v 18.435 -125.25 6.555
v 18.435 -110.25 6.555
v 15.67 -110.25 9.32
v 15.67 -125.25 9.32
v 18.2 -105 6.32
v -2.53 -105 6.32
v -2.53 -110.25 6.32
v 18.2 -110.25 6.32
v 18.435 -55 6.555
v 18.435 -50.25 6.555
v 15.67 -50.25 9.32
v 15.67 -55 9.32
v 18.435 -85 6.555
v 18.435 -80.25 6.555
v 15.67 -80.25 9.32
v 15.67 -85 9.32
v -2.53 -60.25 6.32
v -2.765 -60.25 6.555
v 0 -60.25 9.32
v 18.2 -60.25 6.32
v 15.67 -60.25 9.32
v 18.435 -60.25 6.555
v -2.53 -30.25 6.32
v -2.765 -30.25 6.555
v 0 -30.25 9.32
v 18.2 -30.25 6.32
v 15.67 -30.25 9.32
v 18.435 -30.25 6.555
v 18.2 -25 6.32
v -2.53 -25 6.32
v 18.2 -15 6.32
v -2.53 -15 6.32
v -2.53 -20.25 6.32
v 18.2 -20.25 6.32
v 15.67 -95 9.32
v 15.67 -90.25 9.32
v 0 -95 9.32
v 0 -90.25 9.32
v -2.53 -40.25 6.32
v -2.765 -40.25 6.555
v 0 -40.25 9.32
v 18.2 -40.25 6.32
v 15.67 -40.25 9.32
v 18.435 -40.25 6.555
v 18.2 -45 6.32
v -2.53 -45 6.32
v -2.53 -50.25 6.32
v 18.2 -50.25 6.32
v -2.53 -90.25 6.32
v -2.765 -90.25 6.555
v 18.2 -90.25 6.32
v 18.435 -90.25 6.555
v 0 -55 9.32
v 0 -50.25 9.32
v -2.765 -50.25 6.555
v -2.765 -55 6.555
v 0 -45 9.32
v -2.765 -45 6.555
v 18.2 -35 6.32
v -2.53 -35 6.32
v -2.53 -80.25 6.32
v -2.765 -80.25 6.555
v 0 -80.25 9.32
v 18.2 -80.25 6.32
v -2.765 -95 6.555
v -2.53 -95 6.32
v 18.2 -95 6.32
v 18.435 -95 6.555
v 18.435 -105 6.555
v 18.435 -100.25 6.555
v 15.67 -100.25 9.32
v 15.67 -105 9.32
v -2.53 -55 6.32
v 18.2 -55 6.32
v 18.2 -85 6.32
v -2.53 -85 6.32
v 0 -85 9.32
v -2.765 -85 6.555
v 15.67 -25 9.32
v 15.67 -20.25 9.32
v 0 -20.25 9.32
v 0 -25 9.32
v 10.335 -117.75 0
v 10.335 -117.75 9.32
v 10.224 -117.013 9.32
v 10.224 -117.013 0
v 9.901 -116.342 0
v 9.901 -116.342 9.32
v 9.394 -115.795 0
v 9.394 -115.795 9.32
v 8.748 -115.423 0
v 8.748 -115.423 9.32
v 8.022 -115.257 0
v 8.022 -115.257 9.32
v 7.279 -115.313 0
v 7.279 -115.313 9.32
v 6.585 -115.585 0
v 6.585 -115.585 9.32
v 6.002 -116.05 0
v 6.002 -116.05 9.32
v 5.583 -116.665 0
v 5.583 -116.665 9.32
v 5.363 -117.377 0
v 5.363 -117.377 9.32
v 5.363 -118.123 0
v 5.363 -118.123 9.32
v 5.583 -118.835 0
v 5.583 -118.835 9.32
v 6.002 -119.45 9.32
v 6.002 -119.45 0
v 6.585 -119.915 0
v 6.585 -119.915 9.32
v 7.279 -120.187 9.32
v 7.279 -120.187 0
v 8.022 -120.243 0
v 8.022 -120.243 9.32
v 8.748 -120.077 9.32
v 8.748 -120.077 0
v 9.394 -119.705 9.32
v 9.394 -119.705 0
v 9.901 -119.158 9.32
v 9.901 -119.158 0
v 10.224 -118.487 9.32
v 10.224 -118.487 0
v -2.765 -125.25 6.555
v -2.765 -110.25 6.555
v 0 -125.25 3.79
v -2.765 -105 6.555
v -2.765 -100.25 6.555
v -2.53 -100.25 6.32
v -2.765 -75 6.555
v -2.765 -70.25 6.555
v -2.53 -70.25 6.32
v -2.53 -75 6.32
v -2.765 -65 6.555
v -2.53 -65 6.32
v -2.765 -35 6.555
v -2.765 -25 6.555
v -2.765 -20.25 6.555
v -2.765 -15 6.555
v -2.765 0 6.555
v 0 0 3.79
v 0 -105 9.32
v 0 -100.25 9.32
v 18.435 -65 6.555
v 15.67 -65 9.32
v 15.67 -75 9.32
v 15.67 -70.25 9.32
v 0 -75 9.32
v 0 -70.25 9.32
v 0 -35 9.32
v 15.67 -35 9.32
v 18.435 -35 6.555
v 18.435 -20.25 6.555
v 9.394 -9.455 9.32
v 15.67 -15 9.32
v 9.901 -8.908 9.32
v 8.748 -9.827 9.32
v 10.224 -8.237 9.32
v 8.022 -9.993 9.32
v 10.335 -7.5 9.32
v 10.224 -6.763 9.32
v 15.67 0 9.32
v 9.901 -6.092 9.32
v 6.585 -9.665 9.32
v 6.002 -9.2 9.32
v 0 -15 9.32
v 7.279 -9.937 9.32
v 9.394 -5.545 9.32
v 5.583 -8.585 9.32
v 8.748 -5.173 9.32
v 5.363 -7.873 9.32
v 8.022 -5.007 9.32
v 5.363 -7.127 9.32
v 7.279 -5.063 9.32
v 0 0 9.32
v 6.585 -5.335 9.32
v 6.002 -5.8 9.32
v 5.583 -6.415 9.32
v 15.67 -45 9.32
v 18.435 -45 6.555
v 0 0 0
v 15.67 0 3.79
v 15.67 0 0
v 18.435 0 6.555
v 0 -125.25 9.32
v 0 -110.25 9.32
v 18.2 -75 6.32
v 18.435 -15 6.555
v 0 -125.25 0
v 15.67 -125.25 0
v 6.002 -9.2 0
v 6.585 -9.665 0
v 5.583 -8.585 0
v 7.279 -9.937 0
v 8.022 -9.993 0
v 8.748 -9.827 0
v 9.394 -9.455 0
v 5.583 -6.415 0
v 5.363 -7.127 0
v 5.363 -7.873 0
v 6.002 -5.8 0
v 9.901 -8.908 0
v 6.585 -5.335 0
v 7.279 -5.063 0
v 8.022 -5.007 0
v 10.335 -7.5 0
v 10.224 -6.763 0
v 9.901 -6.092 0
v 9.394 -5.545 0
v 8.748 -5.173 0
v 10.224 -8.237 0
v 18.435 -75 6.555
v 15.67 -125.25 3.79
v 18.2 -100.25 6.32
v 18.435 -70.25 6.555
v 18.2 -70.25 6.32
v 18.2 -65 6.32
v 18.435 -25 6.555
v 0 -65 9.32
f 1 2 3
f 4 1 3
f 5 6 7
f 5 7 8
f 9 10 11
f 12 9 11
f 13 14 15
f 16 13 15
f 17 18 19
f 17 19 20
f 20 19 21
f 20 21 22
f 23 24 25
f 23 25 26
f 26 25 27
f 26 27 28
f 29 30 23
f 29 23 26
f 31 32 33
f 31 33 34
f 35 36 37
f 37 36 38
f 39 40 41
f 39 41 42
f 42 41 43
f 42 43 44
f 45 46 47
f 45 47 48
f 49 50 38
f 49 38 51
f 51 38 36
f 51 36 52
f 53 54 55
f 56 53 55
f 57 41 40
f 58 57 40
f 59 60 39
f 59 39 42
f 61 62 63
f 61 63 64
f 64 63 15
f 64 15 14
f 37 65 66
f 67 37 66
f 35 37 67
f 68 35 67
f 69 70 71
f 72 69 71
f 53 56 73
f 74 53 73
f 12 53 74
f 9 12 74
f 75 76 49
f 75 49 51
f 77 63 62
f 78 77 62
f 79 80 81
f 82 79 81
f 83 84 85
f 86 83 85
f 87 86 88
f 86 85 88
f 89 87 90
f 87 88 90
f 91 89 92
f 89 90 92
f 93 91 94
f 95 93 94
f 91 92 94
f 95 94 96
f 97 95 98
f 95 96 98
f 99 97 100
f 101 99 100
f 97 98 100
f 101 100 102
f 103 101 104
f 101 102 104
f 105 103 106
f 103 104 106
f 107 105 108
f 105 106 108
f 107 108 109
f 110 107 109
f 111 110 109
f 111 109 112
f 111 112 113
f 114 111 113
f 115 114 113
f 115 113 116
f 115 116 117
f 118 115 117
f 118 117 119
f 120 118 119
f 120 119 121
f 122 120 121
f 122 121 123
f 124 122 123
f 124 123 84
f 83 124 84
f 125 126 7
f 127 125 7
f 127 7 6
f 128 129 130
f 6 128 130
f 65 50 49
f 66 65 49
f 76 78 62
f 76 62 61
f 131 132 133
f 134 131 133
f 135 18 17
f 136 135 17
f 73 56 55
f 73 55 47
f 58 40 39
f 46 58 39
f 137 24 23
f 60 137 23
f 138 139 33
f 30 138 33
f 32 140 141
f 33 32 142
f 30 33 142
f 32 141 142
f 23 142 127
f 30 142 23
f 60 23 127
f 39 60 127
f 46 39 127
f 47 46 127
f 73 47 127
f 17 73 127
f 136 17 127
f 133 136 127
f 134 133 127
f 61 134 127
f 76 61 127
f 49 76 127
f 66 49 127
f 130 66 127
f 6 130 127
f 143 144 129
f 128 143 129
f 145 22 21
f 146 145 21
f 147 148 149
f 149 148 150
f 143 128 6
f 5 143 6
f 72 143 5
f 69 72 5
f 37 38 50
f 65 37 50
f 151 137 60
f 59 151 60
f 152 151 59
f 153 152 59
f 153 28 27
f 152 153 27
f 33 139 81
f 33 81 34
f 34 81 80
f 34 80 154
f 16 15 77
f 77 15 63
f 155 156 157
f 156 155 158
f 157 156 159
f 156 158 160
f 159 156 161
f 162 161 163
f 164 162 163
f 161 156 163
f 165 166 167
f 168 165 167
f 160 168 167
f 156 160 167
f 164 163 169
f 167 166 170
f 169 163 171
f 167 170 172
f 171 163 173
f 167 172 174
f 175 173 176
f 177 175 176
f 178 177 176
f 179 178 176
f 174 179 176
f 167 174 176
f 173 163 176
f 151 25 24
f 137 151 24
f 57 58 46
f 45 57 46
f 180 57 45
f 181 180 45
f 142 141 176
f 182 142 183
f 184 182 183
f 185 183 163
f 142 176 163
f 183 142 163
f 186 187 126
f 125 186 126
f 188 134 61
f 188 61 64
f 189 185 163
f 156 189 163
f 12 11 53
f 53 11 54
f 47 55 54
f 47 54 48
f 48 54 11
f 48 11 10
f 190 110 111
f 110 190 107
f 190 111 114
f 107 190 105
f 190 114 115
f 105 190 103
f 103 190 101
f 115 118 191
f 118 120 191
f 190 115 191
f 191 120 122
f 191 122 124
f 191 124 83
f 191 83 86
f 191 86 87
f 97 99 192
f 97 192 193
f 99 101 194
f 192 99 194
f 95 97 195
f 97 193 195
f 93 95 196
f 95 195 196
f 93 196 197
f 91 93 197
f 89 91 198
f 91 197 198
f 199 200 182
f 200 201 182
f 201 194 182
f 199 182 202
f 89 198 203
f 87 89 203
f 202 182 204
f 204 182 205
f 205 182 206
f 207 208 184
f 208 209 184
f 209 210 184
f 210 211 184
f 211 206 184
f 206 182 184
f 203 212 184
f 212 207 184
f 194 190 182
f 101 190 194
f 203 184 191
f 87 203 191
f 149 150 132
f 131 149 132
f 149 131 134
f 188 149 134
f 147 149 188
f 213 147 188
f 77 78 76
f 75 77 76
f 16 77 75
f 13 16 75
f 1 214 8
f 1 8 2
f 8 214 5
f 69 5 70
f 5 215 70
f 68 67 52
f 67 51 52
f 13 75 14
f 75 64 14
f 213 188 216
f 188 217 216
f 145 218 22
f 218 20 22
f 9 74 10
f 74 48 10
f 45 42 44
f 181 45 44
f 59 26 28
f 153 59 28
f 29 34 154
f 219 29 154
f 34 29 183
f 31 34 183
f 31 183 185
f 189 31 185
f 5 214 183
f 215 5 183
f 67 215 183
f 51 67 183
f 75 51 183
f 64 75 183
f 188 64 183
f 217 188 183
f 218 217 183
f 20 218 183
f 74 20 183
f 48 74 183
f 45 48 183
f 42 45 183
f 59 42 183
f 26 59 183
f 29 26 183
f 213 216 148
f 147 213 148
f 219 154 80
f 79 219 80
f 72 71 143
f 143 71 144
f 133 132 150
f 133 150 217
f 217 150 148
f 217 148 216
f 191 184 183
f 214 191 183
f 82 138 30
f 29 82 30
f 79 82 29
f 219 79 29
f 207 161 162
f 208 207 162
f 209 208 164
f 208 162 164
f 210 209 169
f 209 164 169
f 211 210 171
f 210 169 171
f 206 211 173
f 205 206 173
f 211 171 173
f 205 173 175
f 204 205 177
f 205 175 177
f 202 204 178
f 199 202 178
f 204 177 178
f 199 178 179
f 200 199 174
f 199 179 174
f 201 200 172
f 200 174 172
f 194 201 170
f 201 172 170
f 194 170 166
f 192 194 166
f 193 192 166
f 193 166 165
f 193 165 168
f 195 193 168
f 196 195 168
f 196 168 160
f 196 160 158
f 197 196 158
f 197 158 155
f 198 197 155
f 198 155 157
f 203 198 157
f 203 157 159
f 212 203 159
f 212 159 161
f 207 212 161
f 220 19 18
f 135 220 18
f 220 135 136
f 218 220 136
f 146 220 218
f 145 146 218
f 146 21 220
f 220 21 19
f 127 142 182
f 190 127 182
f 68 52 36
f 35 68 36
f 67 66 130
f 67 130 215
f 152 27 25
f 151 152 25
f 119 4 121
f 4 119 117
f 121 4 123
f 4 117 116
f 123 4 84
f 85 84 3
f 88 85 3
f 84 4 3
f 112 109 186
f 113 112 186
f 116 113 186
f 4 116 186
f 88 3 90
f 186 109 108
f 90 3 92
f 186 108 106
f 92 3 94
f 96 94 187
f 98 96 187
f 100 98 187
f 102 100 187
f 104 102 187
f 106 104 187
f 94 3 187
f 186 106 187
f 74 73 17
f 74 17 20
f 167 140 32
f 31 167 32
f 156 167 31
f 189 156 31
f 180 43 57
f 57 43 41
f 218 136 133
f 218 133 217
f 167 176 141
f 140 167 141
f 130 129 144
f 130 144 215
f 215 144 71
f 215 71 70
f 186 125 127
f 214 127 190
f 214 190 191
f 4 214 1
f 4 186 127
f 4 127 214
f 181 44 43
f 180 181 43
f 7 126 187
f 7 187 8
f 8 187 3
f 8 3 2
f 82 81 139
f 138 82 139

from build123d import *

# Parameters (mm, degrees)
F1_DEPTH = 125.25
F2_W     = 55.821885
F2_H     = 5.25
F3_DEPTH = 3
F4_R     = 2.5
F5_DEPTH = 25


with BuildPart() as f1:
    # F0 (on Front) → F1 (new body)
    with BuildSketch(Plane.XZ):
        Polygon((0, 3.79), (0, 0), (15.67, 0), (15.67, 3.79), (18.435, 6.555), (15.67, 9.32), (0, 9.32), (-2.765, 6.555), align=None)
    extrude(amount=F1_DEPTH)

    # F2 (on face) → F3 (cut)
    with BuildSketch(Plane.XY.offset(9.32)):
        with Locations((8.211463, -17.625)):
            Rectangle(F2_W, F2_H)
        with Locations((8.211463, -27.625)):
            Rectangle(F2_W, F2_H)
        with Locations((8.211463, -37.625)):
            Rectangle(F2_W, F2_H)
        with Locations((8.211463, -47.625)):
            Rectangle(F2_W, F2_H)
        with Locations((8.211463, -57.625)):
            Rectangle(F2_W, F2_H)
        with Locations((8.211463, -67.625)):
            Rectangle(F2_W, F2_H)
        with Locations((8.211463, -77.625)):
            Rectangle(F2_W, F2_H)
        with Locations((8.211463, -87.625)):
            Rectangle(F2_W, F2_H)
        with Locations((8.211463, -97.625)):
            Rectangle(F2_W, F2_H)
        with Locations((8.211463, -107.625)):
            Rectangle(F2_W, F2_H)
    extrude(amount=-F3_DEPTH, mode=Mode.SUBTRACT)

    # F4 (on face) → F5 (cut)
    with BuildSketch(Plane.XY.offset(9.32)):
        with Locations((7.835, -7.5)):
            Circle(F4_R)
        with Locations((7.835, -117.75)):
            Circle(F4_R)
    extrude(amount=-F5_DEPTH, mode=Mode.SUBTRACT)


solid = f1.part
